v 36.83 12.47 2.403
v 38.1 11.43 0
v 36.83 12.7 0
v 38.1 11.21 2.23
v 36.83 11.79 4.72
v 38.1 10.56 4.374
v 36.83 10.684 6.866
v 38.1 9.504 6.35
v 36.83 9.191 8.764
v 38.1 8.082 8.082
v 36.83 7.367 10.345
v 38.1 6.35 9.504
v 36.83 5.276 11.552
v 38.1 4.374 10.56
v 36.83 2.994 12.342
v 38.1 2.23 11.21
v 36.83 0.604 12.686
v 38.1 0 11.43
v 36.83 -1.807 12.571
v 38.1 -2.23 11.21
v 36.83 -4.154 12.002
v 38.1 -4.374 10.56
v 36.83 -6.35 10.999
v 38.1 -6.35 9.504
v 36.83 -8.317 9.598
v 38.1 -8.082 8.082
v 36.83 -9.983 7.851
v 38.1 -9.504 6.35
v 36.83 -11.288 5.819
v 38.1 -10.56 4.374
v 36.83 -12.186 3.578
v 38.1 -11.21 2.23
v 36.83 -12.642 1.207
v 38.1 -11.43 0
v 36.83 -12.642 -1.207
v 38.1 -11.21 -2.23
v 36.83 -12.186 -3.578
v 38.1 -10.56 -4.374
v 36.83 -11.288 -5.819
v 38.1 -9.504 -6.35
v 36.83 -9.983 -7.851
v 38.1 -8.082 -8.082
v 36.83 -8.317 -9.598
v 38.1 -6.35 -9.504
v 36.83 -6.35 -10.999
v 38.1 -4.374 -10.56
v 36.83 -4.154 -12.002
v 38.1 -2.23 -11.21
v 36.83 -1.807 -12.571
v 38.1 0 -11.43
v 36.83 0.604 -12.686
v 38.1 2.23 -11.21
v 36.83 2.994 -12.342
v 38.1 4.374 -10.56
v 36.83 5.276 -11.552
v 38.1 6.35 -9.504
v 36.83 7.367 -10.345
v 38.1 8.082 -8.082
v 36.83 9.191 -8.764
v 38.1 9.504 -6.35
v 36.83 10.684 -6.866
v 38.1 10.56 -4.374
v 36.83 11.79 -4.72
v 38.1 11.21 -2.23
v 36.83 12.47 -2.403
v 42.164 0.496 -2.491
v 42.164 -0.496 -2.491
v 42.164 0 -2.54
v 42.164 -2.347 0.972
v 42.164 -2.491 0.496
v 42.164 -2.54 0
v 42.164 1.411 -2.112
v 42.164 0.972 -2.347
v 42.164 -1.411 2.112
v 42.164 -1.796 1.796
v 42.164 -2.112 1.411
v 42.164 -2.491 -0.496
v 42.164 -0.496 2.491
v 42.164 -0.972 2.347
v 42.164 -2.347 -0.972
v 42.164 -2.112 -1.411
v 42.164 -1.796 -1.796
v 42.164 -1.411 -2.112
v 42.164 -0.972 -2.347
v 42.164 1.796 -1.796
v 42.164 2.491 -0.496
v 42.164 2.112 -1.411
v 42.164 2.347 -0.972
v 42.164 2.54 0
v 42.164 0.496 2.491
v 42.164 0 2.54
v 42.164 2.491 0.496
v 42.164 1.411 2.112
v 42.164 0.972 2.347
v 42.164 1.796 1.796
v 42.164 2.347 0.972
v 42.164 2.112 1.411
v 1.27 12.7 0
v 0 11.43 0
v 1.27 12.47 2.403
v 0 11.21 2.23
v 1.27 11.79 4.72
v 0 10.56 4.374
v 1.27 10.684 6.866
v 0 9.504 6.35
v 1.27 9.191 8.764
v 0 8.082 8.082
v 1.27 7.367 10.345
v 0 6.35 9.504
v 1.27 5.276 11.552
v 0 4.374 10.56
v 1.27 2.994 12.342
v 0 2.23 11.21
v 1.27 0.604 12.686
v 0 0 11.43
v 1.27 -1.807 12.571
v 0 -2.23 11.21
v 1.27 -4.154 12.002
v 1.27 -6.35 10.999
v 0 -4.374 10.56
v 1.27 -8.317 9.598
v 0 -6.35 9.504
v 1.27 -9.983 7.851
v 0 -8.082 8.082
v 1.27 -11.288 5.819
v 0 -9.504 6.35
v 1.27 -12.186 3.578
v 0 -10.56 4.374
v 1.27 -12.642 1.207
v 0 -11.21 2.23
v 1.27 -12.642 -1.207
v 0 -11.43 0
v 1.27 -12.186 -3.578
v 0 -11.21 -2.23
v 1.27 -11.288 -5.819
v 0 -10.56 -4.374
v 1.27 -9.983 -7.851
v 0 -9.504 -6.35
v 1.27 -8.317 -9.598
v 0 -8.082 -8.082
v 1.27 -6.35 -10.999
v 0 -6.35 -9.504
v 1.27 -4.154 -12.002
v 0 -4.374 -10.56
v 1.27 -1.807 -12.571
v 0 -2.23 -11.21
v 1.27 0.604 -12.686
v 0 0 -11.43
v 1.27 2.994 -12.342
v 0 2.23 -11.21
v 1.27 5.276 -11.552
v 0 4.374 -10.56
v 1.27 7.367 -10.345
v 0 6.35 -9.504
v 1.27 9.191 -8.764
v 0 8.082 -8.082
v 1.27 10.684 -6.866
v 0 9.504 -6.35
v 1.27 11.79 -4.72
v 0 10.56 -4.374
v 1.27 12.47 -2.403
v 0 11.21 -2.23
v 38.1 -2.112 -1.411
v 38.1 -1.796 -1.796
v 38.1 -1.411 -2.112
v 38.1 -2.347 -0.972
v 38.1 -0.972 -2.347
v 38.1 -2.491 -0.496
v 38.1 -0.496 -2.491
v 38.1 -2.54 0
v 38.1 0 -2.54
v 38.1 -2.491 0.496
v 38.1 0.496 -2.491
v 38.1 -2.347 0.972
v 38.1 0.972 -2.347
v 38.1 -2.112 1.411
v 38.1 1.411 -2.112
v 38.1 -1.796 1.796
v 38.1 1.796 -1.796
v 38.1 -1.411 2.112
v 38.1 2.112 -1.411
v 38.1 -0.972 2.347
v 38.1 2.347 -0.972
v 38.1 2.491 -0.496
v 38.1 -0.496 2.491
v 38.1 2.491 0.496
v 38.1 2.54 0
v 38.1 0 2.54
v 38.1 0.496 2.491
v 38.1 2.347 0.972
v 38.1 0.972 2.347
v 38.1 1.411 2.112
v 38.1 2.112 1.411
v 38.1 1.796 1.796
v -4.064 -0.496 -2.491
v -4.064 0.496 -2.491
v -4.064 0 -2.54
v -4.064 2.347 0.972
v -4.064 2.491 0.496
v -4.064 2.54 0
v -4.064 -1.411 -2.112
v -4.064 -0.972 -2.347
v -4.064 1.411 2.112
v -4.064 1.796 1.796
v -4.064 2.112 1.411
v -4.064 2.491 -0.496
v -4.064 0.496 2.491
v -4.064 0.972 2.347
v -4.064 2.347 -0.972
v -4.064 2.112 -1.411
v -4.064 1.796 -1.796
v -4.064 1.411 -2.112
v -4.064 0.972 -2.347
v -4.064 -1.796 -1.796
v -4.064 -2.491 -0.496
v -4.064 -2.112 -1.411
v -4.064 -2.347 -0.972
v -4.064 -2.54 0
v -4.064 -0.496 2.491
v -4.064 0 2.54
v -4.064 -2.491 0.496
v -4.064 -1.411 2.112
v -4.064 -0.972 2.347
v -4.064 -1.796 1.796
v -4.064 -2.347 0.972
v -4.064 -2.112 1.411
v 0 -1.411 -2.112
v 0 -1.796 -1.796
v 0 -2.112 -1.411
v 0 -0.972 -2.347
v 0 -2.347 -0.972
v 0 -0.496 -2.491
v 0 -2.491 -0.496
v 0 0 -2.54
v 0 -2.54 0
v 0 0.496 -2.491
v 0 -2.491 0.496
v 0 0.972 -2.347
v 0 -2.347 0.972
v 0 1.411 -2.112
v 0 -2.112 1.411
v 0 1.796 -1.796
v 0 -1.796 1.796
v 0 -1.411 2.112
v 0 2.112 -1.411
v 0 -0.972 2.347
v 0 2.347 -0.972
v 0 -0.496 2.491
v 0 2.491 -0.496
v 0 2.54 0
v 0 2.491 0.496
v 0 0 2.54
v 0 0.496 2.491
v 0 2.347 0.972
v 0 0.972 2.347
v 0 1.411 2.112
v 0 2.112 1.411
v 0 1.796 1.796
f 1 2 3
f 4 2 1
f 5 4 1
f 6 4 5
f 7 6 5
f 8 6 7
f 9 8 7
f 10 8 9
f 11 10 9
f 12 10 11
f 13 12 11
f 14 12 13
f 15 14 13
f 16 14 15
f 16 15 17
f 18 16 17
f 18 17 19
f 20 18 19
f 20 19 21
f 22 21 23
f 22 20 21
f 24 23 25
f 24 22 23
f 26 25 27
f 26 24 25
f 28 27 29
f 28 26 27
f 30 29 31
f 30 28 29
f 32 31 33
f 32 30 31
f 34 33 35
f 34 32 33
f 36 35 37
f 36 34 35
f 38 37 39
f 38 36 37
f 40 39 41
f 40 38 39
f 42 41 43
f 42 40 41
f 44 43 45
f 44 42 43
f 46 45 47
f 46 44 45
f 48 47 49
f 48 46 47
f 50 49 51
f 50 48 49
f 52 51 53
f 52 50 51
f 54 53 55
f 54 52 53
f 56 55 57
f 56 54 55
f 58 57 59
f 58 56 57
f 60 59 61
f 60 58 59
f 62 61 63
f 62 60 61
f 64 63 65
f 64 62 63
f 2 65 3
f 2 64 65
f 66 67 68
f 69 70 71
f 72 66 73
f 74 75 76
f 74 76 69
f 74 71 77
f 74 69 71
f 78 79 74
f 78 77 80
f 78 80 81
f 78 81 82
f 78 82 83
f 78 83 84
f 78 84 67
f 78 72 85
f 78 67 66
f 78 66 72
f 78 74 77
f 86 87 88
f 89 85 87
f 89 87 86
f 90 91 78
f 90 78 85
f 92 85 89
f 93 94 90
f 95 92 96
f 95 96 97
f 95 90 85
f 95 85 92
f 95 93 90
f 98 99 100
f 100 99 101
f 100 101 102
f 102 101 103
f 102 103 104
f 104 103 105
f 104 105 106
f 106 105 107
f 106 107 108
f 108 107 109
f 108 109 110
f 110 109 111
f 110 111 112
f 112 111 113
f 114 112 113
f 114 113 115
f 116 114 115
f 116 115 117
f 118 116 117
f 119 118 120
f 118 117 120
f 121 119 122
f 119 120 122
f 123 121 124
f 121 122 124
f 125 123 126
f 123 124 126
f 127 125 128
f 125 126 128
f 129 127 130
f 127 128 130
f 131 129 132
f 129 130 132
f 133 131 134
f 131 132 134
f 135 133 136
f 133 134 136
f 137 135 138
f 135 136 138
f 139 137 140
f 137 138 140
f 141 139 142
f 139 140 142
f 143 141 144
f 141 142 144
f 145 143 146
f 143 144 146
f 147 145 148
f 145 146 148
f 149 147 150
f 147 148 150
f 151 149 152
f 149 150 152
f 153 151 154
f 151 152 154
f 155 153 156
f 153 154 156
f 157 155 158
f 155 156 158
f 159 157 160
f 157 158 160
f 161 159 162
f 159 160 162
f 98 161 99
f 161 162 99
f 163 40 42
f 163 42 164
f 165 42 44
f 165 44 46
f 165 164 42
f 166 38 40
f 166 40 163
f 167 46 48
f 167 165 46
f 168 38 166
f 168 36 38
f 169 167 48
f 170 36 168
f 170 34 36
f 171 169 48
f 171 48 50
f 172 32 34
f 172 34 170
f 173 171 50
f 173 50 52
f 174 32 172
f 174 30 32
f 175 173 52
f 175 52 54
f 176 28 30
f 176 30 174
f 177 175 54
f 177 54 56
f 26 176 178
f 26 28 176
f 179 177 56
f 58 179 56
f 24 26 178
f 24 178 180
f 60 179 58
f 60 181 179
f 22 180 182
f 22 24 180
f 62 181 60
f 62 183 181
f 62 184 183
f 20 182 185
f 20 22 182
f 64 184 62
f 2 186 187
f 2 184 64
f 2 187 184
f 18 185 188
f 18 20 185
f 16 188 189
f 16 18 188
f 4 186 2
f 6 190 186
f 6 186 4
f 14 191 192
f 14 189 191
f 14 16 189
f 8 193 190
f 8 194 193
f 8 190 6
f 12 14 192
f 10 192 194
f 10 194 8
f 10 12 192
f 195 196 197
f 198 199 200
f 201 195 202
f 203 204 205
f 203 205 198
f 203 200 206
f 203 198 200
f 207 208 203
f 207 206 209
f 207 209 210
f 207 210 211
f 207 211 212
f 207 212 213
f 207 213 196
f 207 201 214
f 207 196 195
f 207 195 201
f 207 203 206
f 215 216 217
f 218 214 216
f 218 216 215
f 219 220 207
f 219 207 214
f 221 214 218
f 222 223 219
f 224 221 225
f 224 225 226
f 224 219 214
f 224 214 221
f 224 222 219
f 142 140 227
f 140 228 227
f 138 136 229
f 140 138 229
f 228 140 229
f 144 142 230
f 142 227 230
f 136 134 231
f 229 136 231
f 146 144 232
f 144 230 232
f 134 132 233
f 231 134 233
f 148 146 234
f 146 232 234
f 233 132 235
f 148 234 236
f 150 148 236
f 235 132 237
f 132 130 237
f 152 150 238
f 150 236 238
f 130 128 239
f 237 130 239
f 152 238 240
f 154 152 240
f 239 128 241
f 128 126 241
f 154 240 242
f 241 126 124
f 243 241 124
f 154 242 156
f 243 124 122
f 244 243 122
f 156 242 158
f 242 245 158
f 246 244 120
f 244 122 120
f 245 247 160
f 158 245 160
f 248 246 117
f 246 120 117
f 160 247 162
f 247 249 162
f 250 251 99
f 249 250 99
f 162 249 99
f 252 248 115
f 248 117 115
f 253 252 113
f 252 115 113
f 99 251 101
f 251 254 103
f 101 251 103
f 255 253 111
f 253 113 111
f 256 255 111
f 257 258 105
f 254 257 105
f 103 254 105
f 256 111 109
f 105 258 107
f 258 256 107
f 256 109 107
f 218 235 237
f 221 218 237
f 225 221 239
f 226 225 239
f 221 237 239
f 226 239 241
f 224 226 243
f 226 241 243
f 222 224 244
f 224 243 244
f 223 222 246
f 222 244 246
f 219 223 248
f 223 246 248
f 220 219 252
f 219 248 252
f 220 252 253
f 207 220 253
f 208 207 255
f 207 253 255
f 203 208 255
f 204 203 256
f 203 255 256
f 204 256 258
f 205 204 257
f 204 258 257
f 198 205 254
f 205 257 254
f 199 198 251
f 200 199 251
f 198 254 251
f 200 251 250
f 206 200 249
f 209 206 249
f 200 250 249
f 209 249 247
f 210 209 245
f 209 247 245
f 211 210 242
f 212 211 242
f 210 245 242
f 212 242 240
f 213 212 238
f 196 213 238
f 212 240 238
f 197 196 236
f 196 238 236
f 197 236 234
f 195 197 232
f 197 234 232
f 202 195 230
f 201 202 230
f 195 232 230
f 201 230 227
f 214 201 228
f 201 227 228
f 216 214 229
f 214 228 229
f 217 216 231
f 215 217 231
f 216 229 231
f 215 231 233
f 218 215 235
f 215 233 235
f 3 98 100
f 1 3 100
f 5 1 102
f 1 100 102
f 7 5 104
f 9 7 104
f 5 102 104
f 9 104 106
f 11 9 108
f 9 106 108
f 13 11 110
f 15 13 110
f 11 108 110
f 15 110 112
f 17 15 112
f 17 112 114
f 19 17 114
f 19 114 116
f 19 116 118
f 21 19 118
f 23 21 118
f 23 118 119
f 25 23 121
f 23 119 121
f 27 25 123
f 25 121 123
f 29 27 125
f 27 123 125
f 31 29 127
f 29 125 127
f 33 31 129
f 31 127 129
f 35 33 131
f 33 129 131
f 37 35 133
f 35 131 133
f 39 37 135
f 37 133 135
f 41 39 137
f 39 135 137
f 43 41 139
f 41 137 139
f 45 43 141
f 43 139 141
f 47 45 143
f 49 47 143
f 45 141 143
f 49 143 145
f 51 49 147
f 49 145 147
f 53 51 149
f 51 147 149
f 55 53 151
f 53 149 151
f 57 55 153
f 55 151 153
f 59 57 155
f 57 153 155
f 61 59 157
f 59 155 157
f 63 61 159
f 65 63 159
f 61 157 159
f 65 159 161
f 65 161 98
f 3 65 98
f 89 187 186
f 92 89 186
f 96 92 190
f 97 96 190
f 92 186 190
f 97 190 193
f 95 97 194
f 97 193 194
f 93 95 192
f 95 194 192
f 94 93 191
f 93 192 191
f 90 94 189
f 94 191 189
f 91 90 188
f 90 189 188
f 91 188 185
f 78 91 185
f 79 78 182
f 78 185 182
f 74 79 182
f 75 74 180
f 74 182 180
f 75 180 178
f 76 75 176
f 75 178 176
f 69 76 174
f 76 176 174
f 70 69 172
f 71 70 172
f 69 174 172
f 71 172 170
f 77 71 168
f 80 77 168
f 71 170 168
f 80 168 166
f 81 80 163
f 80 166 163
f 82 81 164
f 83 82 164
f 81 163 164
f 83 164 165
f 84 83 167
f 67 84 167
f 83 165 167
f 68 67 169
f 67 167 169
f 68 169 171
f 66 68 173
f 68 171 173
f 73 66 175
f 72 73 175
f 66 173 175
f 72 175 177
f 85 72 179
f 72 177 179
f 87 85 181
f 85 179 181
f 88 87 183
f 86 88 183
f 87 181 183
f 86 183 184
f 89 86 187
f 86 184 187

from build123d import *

# Parameters (mm, degrees)
F0_R     = 12.7
F1_DEPTH = 38.1
F2_SIZE  = 1.27
F3_R     = 2.54
F4_DEPTH = 4.064
F5_R     = 2.54
F6_DEPTH = 4.064


with BuildPart() as f1:
    # F0 (on Right) → F1 (new body)
    with BuildSketch(Plane.YZ):
        Circle(F0_R)
    extrude(amount=F1_DEPTH)

    # F2
    f2_edges = [f1.edges().sort_by_distance(p)[0] for p in [
        (0, -12.7, 0),
        (19.05, 12.7, 0),
        (38.1, -12.7, 0),
    ]]
    chamfer(f2_edges, length=F2_SIZE)

    # F3 (on face) → F4 (join)
    with BuildSketch(Plane(origin=(0, 0, 0), x_dir=(0, -1, 0), z_dir=(-1, 0, 0))):
        Circle(F3_R)
    extrude(amount=F4_DEPTH)

    # F5 (on face) → F6 (join)
    with BuildSketch(Plane.YZ.offset(38.1)):
        Circle(F5_R)
    extrude(amount=F6_DEPTH)


solid = f1.part
